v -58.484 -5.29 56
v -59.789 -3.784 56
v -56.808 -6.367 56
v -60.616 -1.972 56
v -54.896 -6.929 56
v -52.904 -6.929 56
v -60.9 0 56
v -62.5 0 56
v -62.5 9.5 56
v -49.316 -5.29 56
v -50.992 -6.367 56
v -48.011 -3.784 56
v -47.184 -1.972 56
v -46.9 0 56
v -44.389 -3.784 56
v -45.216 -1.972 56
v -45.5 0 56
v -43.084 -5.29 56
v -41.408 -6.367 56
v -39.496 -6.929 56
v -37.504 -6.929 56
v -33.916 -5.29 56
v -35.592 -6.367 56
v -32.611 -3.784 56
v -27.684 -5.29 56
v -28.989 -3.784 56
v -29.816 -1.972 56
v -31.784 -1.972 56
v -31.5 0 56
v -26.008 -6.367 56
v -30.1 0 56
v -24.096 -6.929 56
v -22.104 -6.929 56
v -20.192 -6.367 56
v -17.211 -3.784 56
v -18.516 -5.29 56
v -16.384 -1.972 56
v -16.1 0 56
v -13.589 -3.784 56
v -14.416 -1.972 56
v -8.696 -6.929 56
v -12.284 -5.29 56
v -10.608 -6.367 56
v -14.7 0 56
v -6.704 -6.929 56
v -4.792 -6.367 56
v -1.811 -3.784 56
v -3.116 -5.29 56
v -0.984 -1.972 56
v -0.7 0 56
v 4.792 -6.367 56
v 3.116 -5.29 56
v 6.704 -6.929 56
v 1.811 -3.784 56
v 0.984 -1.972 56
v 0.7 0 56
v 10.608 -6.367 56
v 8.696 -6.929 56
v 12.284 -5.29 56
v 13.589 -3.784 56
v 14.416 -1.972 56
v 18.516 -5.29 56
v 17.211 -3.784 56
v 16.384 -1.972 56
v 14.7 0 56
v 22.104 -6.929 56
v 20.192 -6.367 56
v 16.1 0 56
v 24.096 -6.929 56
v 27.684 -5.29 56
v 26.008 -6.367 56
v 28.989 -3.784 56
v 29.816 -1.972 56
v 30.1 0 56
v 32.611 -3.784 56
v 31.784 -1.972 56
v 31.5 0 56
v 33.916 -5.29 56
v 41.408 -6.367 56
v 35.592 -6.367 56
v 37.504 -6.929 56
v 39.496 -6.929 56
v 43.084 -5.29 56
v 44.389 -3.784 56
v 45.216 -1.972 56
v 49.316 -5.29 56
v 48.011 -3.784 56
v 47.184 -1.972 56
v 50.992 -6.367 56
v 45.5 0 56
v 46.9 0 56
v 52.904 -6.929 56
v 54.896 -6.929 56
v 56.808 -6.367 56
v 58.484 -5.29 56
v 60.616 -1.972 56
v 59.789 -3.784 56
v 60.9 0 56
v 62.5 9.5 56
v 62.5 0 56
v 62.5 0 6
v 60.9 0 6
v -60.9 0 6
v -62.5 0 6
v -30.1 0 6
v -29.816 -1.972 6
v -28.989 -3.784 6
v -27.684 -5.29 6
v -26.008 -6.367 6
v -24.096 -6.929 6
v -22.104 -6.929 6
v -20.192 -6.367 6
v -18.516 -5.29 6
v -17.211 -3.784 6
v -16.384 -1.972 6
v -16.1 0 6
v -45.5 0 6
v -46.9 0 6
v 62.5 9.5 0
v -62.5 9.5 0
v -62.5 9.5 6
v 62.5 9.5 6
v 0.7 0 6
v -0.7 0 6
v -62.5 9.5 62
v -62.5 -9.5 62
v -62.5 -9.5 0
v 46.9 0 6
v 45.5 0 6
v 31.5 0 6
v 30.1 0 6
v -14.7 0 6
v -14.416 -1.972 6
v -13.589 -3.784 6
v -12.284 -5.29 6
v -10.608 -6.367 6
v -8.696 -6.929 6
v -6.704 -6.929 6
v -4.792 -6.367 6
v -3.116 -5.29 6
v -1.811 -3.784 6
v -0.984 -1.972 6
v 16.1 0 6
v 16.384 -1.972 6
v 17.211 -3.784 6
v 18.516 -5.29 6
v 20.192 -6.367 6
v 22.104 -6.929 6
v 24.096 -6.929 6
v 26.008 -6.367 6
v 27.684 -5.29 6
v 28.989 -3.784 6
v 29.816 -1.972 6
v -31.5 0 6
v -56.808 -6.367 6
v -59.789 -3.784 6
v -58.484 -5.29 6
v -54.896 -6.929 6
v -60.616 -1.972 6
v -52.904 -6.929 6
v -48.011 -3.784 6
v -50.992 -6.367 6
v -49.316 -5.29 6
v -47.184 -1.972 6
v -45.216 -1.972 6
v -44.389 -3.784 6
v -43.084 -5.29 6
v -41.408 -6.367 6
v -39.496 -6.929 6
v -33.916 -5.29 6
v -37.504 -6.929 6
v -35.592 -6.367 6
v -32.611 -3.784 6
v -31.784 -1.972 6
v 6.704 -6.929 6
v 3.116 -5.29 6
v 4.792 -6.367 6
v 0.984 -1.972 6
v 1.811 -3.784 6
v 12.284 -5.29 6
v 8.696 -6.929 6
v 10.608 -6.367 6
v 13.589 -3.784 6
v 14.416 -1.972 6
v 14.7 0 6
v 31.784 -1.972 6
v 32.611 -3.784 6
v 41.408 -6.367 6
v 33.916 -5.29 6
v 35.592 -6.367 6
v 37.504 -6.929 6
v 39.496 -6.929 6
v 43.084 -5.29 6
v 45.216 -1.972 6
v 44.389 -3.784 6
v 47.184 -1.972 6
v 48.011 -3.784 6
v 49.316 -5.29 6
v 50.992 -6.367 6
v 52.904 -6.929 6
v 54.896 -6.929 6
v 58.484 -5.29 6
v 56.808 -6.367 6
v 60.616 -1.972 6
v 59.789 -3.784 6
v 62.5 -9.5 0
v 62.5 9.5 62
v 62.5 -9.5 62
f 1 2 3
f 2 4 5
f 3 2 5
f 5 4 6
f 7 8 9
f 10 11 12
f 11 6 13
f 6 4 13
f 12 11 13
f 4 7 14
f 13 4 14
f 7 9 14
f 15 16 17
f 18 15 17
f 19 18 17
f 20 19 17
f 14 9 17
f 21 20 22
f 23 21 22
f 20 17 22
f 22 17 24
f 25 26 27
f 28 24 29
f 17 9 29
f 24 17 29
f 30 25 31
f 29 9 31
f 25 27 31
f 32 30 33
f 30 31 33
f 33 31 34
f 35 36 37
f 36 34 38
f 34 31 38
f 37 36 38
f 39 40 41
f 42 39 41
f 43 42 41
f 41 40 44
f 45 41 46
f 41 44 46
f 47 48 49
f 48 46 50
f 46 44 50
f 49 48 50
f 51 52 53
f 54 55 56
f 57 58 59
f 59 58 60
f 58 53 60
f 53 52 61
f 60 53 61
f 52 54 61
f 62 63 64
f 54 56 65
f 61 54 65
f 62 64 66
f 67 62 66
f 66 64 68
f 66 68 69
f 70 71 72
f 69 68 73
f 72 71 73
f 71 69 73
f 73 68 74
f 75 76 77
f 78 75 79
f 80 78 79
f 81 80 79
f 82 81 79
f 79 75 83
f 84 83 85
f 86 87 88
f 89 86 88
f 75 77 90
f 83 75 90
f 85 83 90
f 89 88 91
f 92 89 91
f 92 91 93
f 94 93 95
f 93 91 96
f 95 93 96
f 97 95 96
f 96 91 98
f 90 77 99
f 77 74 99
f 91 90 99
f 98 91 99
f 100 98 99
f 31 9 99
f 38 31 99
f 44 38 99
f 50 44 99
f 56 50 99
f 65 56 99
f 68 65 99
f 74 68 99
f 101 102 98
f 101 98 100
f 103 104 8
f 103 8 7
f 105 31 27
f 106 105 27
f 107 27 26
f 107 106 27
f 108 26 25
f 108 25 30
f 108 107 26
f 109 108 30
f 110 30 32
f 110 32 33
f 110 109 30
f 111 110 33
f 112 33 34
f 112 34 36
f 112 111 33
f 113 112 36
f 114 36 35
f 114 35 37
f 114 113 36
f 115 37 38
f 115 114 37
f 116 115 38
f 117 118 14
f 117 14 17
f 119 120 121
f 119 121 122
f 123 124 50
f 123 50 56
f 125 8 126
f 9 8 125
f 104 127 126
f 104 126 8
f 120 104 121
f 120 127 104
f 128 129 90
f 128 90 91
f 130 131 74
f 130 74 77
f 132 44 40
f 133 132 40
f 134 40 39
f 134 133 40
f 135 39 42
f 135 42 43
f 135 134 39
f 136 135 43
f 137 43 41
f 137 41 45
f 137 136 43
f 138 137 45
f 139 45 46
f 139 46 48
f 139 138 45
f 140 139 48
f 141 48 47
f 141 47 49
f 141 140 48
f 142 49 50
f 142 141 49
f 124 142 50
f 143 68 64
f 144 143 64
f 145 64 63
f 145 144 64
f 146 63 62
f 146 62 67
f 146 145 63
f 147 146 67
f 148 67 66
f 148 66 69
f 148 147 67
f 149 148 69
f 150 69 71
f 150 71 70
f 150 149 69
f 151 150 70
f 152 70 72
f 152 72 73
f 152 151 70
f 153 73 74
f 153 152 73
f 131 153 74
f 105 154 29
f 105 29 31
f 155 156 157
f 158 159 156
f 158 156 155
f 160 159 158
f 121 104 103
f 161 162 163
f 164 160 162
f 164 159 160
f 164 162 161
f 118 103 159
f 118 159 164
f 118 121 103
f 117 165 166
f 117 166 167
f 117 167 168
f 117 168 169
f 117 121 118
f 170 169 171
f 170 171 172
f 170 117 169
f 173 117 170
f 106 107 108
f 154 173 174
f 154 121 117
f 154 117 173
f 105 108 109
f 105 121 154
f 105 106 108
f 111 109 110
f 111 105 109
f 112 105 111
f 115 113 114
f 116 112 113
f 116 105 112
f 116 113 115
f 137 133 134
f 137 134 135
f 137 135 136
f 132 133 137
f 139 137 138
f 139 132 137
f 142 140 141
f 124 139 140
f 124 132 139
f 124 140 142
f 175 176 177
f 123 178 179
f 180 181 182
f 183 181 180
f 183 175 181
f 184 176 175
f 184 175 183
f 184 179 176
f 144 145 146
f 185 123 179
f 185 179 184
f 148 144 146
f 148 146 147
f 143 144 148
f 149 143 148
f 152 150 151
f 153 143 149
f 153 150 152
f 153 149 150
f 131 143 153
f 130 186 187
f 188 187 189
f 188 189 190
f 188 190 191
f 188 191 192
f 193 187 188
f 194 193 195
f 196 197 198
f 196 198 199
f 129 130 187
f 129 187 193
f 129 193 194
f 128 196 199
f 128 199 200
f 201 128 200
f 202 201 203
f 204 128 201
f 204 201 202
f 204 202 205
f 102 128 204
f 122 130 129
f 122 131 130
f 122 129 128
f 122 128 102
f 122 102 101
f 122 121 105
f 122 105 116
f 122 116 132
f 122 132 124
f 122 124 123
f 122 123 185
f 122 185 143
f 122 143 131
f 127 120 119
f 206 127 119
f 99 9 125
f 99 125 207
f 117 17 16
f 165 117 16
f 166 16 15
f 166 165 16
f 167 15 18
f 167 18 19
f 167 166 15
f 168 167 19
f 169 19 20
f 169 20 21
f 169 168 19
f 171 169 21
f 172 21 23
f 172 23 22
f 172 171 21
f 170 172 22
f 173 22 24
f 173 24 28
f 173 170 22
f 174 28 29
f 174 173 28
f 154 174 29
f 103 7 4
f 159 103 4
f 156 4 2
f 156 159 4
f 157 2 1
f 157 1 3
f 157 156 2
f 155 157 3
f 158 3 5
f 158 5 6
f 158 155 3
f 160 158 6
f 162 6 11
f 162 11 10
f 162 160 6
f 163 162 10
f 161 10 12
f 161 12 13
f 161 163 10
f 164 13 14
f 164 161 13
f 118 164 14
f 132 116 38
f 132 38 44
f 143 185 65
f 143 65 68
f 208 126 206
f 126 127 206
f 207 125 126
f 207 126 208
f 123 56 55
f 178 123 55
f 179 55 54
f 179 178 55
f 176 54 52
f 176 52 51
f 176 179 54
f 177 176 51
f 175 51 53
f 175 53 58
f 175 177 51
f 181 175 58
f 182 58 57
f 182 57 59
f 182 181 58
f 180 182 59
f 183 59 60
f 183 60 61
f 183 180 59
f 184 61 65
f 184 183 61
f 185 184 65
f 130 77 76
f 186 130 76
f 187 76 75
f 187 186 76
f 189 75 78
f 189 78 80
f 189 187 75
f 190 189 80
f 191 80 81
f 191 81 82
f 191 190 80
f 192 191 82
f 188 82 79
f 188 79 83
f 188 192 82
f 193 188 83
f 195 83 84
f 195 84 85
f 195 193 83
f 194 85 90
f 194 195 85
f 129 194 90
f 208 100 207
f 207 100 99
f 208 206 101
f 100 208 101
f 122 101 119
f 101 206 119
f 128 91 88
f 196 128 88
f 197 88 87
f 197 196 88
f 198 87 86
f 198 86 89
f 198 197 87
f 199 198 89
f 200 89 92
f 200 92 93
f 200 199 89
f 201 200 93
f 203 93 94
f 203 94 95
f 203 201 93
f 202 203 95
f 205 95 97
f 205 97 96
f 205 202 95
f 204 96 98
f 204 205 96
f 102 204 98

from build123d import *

# Parameters (mm, degrees)
SKETCH_1_W      = 125
SKETCH_1_H      = 19
EXTRUDE_1_DEPTH = 6
EXTRUDE_2_DEPTH = 50
SKETCH_3_W      = 125
SKETCH_3_H      = 19
EXTRUDE_3_DEPTH = 6


with BuildPart() as part:
    # 草图1 → 凸台-拉伸1 (new body)
    with BuildSketch(Plane.XY):
        Rectangle(SKETCH_1_W, SKETCH_1_H)
    extrude(amount=EXTRUDE_1_DEPTH)

    # 草图2 → 凸台-拉伸2 (add)
    with BuildSketch(Plane.XY.offset(6)):
        with BuildLine():
            Line((-62.5, 0), (-60.9, 0))
            ThreePointArc((-60.9, 0), (-53.9, -7), (-46.9, 0))
            Line((-46.9, 0), (-45.5, 0))
            ThreePointArc((-45.5, 0), (-38.5, -7), (-31.5, 0))
            Line((-31.5, 0), (-30.1, 0))
            ThreePointArc((-30.1, 0), (-23.1, -7), (-16.1, 0))
            Line((-16.1, 0), (-14.7, 0))
            ThreePointArc((-14.7, 0), (-7.7, -7), (-0.7, 0))
            Line((-0.7, 0), (0.7, 0))
            ThreePointArc((0.7, 0), (7.7, -7), (14.7, 0))
            Line((14.7, 0), (16.1, 0))
            ThreePointArc((16.1, 0), (23.1, -7), (30.1, 0))
            Line((30.1, 0), (31.5, 0))
            ThreePointArc((31.5, 0), (38.5, -7), (45.5, 0))
            Line((45.5, 0), (46.9, 0))
            ThreePointArc((46.9, 0), (53.9, -7), (60.9, 0))
            Line((60.9, 0), (62.5, 0))
            Line((62.5, 0), (62.5, -9.5))
            Line((62.5, -9.5), (-62.5, -9.5))
            Line((-62.5, -9.5), (-62.5, 0))
        make_face()
    extrude(amount=EXTRUDE_2_DEPTH)

    # 草图3 → 凸台-拉伸3 (add)
    with BuildSketch(Plane.XY.offset(56)):
        Rectangle(SKETCH_3_W, SKETCH_3_H)
    extrude(amount=EXTRUDE_3_DEPTH)


solid = part.part
